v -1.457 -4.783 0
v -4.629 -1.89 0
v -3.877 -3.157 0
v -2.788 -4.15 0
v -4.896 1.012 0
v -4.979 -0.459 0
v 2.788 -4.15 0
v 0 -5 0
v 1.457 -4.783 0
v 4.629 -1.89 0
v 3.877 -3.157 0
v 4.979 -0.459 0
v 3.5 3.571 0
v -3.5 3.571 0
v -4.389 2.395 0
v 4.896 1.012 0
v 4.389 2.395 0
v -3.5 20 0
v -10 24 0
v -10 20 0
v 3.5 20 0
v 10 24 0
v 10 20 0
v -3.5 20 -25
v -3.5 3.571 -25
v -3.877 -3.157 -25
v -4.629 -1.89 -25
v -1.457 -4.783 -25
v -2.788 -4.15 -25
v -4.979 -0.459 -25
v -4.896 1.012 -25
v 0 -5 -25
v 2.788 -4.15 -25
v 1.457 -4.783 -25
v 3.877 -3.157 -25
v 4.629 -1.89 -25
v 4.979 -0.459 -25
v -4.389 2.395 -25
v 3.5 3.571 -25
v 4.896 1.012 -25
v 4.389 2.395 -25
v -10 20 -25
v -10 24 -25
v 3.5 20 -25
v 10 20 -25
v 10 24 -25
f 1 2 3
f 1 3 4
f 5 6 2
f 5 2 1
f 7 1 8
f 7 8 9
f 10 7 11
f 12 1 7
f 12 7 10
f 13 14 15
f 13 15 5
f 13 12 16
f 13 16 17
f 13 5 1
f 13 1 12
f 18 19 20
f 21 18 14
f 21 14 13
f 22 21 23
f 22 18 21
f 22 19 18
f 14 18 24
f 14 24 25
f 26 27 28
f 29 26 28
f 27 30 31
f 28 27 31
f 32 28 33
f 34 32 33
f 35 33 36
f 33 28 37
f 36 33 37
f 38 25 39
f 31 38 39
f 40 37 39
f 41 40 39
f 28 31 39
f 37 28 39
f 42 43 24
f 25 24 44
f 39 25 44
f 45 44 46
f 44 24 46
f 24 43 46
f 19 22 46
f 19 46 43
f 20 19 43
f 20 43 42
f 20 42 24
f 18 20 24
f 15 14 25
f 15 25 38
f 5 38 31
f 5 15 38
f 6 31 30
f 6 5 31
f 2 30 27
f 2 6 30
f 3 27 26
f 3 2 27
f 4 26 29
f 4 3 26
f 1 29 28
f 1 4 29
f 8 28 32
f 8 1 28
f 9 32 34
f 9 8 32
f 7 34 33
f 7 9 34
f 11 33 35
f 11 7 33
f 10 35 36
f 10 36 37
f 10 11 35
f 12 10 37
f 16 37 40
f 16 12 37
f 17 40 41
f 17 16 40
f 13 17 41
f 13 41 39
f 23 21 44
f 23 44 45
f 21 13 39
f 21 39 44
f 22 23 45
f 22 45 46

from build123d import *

# Parameters (mm, degrees)
F1_DEPTH = 25


with BuildPart() as f1:
    # F0 (on Top) → F1 (new body)
    with BuildSketch(Plane.XY):
        with BuildLine():
            Line((-3.5, 20), (-3.5, 3.570714))
            ThreePointArc((-3.5, 3.570714), (0, -5), (3.5, 3.570714))
            Line((3.5, 3.570714), (3.5, 20))
            Line((3.5, 20), (10, 20))
            Line((10, 20), (10, 24))
            Line((10, 24), (-10, 24))
            Line((-10, 24), (-10, 20))
            Line((-10, 20), (-3.5, 20))
        make_face()
    extrude(amount=-F1_DEPTH)


solid = f1.part
